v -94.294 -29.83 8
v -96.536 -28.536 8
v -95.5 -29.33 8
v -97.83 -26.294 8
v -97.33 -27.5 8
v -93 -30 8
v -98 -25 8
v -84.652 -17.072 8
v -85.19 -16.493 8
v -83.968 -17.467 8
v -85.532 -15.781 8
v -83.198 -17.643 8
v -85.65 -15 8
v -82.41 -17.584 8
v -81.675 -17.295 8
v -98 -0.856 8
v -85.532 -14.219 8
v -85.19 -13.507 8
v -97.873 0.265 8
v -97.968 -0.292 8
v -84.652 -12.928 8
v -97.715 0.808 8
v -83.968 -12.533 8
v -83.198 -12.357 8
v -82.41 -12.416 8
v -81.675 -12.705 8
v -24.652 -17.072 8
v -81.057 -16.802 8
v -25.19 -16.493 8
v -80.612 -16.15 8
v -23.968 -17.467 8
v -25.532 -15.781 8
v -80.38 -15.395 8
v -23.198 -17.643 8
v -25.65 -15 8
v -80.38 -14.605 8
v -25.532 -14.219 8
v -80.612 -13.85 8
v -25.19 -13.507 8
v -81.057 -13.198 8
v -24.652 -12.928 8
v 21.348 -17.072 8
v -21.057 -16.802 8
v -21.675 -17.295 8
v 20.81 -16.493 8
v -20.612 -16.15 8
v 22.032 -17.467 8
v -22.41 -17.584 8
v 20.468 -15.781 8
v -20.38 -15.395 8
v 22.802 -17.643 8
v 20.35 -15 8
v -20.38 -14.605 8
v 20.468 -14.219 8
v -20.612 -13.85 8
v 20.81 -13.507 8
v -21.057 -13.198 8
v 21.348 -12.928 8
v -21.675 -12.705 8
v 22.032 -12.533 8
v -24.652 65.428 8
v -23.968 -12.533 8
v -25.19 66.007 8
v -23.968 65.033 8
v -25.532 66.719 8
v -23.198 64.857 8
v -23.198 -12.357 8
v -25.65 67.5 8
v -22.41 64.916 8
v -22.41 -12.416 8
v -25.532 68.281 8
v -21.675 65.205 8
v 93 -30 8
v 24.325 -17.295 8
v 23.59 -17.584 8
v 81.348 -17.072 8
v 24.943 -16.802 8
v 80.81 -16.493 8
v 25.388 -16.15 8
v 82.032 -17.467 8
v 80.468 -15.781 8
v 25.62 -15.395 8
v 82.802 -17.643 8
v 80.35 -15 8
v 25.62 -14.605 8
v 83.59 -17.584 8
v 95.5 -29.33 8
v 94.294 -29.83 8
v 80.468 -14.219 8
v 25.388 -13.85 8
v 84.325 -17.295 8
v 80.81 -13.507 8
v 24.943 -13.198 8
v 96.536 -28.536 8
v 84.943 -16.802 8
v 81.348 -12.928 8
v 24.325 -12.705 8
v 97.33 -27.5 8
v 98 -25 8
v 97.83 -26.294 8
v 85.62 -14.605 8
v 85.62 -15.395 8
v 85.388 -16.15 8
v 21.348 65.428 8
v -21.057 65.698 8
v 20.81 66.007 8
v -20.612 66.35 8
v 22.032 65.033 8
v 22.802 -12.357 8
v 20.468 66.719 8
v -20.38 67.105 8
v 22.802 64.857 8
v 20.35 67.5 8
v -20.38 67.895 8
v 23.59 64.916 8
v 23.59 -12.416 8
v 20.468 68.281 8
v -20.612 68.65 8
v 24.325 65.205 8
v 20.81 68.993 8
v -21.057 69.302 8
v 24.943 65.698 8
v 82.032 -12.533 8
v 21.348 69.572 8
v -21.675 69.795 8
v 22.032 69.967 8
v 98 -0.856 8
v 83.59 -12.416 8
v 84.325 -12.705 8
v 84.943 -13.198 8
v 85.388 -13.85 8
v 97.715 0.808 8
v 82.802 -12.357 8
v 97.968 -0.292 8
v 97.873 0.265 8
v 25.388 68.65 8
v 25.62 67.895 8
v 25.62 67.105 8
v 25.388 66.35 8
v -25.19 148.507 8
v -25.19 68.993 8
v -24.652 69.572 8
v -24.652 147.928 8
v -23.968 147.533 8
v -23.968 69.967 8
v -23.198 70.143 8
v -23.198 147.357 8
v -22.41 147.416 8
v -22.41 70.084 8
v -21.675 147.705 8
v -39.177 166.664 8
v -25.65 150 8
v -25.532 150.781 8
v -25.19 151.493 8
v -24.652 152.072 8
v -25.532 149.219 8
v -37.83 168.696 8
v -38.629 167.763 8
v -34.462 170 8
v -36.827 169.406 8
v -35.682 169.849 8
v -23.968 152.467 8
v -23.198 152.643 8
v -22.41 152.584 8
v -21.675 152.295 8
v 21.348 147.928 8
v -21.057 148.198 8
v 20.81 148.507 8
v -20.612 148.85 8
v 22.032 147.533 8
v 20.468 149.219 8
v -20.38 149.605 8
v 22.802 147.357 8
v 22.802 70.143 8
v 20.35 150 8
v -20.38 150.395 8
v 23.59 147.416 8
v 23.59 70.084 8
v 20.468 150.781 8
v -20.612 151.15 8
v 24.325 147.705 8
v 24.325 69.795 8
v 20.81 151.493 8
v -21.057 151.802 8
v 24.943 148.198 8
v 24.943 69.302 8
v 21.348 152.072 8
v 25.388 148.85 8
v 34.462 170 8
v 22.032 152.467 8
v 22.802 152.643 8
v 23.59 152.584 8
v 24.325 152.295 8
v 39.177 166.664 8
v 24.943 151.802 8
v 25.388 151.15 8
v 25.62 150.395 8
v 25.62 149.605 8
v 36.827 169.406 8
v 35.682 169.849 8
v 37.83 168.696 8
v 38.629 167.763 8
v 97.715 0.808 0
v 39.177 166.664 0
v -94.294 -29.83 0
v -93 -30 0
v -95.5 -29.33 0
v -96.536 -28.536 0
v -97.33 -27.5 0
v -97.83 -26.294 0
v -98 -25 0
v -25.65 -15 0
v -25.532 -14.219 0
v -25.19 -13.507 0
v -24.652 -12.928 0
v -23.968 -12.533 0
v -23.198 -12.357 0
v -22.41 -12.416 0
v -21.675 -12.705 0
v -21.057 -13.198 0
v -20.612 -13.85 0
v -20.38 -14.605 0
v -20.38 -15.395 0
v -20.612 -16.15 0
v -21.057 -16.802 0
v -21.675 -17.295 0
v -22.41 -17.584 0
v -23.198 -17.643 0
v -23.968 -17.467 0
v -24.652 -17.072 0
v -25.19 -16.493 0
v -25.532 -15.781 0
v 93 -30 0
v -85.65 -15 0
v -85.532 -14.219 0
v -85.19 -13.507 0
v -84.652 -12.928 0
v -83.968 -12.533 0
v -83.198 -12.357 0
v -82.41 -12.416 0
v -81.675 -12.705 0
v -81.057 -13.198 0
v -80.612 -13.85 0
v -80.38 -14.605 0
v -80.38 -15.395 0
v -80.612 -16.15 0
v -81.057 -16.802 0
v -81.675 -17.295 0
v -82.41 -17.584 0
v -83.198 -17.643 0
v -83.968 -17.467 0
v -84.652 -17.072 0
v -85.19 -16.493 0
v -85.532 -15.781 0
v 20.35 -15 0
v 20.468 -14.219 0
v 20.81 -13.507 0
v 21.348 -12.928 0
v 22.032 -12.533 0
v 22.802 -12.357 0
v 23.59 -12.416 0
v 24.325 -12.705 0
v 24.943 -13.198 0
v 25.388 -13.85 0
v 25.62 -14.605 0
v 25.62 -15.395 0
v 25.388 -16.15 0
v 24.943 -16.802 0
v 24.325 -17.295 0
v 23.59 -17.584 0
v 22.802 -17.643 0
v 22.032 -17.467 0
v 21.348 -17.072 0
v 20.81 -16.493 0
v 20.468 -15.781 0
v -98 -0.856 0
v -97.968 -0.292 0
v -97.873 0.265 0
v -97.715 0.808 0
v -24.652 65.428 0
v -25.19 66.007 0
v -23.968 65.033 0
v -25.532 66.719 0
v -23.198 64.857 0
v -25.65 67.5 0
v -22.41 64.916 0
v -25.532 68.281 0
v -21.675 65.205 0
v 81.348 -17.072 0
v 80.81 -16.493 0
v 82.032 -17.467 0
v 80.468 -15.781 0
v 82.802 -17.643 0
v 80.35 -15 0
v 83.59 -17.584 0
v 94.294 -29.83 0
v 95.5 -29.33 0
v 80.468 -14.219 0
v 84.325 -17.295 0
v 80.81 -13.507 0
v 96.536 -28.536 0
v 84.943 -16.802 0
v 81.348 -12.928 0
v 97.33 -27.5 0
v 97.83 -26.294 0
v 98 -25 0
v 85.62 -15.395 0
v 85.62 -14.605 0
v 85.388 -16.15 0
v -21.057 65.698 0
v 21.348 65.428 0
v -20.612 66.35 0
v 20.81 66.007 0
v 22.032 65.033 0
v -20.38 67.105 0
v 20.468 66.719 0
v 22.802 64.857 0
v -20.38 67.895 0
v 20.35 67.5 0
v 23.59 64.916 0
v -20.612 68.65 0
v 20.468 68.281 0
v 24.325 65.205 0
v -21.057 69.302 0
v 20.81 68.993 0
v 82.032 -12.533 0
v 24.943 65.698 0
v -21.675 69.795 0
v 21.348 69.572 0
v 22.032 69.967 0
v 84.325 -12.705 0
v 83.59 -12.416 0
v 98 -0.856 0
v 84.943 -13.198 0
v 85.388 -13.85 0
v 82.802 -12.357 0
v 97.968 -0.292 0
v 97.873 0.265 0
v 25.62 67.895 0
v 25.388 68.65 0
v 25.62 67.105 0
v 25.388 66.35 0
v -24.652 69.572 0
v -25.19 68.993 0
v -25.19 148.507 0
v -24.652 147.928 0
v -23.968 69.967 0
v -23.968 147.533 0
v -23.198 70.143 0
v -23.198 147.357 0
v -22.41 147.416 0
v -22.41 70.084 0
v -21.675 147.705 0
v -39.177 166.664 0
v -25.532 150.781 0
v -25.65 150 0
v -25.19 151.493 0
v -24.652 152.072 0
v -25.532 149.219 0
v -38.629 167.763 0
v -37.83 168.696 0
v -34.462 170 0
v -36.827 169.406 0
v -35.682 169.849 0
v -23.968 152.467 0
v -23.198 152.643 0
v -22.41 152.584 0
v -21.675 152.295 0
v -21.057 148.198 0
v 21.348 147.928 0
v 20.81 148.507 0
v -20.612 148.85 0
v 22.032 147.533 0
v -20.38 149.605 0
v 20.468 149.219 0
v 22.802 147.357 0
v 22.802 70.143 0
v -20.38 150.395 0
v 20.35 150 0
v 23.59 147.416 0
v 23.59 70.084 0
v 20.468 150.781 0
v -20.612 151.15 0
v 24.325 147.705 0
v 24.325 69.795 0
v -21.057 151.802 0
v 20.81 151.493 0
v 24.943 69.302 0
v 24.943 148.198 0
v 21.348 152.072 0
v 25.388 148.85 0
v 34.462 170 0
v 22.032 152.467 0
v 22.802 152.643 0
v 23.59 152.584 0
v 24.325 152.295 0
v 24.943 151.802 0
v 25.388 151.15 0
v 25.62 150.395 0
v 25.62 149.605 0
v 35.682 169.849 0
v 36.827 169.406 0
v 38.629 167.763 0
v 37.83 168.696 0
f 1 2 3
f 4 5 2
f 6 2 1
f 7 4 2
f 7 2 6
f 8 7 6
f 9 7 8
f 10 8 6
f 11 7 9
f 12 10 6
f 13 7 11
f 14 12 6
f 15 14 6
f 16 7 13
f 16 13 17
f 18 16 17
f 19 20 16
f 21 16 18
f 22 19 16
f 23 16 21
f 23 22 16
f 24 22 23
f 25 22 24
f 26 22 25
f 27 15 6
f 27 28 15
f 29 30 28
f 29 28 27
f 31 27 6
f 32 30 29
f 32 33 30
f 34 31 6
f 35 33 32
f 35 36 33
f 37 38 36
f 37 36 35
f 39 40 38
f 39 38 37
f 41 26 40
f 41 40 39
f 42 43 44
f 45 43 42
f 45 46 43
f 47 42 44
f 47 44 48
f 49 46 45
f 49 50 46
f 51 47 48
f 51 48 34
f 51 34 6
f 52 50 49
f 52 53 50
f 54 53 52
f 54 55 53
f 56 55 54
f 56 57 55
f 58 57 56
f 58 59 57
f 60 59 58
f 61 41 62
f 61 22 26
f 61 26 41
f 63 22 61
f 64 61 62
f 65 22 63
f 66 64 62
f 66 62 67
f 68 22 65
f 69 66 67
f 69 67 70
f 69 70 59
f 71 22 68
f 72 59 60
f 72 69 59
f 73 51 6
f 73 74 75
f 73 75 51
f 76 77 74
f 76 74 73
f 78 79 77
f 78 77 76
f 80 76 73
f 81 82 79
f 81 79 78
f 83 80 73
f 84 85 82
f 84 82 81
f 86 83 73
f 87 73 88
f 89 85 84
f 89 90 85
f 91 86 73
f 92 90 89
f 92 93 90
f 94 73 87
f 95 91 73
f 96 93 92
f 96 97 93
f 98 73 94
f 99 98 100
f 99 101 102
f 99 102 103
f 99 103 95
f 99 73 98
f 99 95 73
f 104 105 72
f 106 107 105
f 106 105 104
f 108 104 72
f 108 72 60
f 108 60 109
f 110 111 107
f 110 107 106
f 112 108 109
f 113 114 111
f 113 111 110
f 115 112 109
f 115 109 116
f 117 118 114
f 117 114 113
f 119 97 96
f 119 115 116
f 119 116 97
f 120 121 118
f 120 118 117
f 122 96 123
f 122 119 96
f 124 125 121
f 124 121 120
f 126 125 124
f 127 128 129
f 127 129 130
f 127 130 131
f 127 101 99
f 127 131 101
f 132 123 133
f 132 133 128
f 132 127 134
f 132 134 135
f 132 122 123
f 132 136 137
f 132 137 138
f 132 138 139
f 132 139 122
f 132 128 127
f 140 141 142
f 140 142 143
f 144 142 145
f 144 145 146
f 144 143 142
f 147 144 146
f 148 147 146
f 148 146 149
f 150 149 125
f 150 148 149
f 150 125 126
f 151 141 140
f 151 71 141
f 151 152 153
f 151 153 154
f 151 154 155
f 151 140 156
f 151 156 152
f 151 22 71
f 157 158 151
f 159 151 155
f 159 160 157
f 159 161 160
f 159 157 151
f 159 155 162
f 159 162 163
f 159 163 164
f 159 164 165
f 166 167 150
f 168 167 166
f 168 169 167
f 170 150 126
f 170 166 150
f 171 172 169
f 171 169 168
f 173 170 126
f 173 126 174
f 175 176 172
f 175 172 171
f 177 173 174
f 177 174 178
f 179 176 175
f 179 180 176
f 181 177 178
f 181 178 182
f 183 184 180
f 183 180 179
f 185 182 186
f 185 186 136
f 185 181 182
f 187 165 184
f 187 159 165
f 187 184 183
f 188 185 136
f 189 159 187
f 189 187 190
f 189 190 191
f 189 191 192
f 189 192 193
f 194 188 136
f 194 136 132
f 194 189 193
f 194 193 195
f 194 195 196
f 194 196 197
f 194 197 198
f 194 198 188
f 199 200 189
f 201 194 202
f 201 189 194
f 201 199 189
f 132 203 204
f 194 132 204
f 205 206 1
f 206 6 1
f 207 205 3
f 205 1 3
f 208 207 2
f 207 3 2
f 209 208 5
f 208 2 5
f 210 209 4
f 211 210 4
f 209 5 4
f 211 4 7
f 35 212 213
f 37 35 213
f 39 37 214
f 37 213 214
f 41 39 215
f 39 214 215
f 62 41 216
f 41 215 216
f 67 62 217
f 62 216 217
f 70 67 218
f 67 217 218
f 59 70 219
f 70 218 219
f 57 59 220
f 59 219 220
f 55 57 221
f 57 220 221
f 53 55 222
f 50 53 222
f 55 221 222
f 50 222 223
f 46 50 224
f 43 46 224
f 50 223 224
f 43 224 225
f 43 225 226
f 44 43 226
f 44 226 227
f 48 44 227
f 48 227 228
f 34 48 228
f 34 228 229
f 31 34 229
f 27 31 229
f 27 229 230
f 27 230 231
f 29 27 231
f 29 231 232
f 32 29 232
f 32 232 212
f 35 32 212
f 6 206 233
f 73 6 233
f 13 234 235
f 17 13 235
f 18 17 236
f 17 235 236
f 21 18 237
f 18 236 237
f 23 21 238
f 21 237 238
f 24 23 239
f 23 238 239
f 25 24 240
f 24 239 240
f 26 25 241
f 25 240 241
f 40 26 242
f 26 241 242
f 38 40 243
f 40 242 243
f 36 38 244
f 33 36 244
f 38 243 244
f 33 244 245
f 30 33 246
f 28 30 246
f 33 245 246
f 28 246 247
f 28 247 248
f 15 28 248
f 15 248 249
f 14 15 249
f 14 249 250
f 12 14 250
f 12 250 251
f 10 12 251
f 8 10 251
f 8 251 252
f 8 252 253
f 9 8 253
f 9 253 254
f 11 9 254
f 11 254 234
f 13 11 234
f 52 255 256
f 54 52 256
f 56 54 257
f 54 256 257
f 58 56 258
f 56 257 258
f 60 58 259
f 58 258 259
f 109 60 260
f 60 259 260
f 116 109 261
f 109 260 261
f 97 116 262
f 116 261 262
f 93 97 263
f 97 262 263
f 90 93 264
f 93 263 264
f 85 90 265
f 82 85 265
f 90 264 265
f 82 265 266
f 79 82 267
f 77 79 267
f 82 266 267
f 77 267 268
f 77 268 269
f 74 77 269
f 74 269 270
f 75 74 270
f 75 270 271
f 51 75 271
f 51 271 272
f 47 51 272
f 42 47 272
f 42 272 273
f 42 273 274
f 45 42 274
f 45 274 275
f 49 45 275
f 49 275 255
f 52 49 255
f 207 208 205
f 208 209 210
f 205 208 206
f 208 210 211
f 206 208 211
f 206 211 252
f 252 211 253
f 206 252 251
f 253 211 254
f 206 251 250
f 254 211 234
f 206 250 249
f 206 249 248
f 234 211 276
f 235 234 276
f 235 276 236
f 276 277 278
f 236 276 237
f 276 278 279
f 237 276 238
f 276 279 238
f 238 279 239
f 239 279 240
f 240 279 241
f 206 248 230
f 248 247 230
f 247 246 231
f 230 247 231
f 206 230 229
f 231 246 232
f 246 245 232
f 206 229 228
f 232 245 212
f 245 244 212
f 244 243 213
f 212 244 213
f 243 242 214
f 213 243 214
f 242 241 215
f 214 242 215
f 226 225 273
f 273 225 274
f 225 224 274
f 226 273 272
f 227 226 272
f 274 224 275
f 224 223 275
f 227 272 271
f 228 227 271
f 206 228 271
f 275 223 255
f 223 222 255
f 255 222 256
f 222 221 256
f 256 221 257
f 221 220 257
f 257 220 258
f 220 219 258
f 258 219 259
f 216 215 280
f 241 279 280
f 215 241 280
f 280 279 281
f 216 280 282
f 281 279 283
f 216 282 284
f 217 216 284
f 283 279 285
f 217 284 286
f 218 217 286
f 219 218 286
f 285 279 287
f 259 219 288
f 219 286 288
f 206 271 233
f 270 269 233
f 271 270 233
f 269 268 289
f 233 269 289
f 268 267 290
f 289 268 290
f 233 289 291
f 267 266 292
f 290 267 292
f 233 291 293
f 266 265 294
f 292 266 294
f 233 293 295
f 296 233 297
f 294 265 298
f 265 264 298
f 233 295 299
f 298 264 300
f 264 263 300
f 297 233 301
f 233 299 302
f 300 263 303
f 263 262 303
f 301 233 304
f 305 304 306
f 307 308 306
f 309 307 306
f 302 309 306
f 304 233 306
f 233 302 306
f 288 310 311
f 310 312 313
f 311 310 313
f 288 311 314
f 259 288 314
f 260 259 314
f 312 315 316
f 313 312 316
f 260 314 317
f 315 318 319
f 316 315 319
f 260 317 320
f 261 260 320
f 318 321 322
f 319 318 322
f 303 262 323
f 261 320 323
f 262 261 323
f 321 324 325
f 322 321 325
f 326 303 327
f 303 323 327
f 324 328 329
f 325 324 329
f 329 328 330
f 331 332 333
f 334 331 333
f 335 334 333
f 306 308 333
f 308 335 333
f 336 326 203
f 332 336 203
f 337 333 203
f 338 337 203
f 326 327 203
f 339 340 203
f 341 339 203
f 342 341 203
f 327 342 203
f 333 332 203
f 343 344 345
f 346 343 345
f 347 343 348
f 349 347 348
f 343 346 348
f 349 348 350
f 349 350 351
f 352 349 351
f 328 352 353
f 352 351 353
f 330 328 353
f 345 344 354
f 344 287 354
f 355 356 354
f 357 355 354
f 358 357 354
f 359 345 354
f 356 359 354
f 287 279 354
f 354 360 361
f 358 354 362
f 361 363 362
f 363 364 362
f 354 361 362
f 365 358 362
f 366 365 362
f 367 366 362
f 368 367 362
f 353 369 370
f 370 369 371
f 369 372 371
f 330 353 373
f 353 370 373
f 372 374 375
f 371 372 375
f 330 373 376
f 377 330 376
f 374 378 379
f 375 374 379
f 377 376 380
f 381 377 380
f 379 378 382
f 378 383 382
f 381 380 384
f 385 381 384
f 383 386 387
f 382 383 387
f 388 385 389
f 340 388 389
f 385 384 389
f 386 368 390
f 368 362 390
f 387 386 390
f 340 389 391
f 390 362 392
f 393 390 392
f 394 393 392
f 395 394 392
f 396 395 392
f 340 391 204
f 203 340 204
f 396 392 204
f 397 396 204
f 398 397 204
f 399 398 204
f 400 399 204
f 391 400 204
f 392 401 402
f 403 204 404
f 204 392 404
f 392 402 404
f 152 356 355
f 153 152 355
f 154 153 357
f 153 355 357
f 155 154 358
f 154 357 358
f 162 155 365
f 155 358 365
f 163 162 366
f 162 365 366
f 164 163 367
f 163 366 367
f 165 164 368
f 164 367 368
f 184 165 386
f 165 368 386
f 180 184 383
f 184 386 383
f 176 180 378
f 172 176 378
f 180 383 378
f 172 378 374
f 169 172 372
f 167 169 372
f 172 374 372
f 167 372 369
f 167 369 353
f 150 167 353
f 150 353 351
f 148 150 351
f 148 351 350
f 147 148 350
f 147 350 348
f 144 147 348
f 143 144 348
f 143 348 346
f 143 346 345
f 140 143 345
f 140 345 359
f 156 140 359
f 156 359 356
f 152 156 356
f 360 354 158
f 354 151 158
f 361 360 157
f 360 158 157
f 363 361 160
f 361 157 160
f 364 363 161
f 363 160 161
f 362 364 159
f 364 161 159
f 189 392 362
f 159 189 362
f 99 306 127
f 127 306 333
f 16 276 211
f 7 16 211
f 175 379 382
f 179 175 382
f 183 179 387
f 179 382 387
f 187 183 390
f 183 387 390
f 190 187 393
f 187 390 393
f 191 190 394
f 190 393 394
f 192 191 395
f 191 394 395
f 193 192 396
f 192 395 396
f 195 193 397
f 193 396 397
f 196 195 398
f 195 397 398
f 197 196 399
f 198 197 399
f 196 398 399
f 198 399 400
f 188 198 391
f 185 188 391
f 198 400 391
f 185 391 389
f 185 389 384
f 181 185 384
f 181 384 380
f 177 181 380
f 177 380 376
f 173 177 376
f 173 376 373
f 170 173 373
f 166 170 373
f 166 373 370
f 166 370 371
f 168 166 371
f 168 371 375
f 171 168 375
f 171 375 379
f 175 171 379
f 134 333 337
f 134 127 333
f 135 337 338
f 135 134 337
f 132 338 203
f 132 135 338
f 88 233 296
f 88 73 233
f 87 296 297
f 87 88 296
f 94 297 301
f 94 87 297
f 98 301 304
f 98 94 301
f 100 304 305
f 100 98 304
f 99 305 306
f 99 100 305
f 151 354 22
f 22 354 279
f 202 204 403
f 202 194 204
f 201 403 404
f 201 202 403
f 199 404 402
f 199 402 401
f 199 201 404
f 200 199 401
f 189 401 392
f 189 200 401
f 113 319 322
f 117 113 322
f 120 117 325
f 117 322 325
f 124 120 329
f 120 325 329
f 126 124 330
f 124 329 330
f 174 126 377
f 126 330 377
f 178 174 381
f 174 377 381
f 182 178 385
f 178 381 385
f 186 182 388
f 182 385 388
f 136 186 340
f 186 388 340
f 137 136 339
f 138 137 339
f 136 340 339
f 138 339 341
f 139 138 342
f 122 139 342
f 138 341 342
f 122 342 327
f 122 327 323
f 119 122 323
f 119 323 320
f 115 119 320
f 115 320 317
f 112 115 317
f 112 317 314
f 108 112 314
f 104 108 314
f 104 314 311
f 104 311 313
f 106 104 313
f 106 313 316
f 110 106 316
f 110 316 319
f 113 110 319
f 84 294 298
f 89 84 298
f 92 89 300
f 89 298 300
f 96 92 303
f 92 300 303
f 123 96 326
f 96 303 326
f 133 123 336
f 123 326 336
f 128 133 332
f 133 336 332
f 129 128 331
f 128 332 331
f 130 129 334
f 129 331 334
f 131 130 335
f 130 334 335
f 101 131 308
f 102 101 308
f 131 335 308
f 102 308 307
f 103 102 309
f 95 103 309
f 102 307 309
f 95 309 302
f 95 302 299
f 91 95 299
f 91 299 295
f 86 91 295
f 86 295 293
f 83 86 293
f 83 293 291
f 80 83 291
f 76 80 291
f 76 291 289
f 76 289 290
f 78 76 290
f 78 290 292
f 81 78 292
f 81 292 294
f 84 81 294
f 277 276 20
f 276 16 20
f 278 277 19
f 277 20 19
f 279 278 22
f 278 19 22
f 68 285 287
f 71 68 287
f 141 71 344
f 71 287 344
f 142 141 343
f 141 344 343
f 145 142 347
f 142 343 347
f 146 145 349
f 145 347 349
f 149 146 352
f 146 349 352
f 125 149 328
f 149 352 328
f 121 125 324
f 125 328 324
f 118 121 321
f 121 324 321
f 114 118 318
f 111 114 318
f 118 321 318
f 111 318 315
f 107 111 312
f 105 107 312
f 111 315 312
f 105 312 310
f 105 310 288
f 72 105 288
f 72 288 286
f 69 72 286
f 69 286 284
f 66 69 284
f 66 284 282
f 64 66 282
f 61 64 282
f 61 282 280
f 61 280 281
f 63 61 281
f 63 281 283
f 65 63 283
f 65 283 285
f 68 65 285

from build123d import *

# Parameters (mm, degrees)
BOSS_EXTRUDE1_DEPTH  = 8
M5_CLEARANCE_HOLE1_D = 5.3
FILLET1_R            = 5


with BuildPart() as part:
    # Sketch1 → Boss-Extrude1 (new body)
    with BuildSketch(Plane.XY):
        Polygon((-98, -30), (98, -30), (98, 0), (38, 170), (-38, 170), (-98, 0), align=None)
    extrude(amount=BOSS_EXTRUDE1_DEPTH)

    # M5 Clearance Hole1 (through all)
    with Locations(Plane.XY.offset(8)):
        with Locations((-23, 150), (-23, 67.5), (-23, -15), (23, -15), (23, 150), (23, 67.5), (-83, -15), (83, -15)):
            Hole(M5_CLEARANCE_HOLE1_D / 2)

    # Fillet1
    fillet1_edges = [part.edges().sort_by_distance(p)[0] for p in [
        (-98, 0, 4),
        (-38, 170, 4),
        (38, 170, 4),
        (98, 0, 4),
        (98, -30, 4),
        (-98, -30, 4),
    ]]
    fillet(fillet1_edges, radius=FILLET1_R)


solid = part.part
